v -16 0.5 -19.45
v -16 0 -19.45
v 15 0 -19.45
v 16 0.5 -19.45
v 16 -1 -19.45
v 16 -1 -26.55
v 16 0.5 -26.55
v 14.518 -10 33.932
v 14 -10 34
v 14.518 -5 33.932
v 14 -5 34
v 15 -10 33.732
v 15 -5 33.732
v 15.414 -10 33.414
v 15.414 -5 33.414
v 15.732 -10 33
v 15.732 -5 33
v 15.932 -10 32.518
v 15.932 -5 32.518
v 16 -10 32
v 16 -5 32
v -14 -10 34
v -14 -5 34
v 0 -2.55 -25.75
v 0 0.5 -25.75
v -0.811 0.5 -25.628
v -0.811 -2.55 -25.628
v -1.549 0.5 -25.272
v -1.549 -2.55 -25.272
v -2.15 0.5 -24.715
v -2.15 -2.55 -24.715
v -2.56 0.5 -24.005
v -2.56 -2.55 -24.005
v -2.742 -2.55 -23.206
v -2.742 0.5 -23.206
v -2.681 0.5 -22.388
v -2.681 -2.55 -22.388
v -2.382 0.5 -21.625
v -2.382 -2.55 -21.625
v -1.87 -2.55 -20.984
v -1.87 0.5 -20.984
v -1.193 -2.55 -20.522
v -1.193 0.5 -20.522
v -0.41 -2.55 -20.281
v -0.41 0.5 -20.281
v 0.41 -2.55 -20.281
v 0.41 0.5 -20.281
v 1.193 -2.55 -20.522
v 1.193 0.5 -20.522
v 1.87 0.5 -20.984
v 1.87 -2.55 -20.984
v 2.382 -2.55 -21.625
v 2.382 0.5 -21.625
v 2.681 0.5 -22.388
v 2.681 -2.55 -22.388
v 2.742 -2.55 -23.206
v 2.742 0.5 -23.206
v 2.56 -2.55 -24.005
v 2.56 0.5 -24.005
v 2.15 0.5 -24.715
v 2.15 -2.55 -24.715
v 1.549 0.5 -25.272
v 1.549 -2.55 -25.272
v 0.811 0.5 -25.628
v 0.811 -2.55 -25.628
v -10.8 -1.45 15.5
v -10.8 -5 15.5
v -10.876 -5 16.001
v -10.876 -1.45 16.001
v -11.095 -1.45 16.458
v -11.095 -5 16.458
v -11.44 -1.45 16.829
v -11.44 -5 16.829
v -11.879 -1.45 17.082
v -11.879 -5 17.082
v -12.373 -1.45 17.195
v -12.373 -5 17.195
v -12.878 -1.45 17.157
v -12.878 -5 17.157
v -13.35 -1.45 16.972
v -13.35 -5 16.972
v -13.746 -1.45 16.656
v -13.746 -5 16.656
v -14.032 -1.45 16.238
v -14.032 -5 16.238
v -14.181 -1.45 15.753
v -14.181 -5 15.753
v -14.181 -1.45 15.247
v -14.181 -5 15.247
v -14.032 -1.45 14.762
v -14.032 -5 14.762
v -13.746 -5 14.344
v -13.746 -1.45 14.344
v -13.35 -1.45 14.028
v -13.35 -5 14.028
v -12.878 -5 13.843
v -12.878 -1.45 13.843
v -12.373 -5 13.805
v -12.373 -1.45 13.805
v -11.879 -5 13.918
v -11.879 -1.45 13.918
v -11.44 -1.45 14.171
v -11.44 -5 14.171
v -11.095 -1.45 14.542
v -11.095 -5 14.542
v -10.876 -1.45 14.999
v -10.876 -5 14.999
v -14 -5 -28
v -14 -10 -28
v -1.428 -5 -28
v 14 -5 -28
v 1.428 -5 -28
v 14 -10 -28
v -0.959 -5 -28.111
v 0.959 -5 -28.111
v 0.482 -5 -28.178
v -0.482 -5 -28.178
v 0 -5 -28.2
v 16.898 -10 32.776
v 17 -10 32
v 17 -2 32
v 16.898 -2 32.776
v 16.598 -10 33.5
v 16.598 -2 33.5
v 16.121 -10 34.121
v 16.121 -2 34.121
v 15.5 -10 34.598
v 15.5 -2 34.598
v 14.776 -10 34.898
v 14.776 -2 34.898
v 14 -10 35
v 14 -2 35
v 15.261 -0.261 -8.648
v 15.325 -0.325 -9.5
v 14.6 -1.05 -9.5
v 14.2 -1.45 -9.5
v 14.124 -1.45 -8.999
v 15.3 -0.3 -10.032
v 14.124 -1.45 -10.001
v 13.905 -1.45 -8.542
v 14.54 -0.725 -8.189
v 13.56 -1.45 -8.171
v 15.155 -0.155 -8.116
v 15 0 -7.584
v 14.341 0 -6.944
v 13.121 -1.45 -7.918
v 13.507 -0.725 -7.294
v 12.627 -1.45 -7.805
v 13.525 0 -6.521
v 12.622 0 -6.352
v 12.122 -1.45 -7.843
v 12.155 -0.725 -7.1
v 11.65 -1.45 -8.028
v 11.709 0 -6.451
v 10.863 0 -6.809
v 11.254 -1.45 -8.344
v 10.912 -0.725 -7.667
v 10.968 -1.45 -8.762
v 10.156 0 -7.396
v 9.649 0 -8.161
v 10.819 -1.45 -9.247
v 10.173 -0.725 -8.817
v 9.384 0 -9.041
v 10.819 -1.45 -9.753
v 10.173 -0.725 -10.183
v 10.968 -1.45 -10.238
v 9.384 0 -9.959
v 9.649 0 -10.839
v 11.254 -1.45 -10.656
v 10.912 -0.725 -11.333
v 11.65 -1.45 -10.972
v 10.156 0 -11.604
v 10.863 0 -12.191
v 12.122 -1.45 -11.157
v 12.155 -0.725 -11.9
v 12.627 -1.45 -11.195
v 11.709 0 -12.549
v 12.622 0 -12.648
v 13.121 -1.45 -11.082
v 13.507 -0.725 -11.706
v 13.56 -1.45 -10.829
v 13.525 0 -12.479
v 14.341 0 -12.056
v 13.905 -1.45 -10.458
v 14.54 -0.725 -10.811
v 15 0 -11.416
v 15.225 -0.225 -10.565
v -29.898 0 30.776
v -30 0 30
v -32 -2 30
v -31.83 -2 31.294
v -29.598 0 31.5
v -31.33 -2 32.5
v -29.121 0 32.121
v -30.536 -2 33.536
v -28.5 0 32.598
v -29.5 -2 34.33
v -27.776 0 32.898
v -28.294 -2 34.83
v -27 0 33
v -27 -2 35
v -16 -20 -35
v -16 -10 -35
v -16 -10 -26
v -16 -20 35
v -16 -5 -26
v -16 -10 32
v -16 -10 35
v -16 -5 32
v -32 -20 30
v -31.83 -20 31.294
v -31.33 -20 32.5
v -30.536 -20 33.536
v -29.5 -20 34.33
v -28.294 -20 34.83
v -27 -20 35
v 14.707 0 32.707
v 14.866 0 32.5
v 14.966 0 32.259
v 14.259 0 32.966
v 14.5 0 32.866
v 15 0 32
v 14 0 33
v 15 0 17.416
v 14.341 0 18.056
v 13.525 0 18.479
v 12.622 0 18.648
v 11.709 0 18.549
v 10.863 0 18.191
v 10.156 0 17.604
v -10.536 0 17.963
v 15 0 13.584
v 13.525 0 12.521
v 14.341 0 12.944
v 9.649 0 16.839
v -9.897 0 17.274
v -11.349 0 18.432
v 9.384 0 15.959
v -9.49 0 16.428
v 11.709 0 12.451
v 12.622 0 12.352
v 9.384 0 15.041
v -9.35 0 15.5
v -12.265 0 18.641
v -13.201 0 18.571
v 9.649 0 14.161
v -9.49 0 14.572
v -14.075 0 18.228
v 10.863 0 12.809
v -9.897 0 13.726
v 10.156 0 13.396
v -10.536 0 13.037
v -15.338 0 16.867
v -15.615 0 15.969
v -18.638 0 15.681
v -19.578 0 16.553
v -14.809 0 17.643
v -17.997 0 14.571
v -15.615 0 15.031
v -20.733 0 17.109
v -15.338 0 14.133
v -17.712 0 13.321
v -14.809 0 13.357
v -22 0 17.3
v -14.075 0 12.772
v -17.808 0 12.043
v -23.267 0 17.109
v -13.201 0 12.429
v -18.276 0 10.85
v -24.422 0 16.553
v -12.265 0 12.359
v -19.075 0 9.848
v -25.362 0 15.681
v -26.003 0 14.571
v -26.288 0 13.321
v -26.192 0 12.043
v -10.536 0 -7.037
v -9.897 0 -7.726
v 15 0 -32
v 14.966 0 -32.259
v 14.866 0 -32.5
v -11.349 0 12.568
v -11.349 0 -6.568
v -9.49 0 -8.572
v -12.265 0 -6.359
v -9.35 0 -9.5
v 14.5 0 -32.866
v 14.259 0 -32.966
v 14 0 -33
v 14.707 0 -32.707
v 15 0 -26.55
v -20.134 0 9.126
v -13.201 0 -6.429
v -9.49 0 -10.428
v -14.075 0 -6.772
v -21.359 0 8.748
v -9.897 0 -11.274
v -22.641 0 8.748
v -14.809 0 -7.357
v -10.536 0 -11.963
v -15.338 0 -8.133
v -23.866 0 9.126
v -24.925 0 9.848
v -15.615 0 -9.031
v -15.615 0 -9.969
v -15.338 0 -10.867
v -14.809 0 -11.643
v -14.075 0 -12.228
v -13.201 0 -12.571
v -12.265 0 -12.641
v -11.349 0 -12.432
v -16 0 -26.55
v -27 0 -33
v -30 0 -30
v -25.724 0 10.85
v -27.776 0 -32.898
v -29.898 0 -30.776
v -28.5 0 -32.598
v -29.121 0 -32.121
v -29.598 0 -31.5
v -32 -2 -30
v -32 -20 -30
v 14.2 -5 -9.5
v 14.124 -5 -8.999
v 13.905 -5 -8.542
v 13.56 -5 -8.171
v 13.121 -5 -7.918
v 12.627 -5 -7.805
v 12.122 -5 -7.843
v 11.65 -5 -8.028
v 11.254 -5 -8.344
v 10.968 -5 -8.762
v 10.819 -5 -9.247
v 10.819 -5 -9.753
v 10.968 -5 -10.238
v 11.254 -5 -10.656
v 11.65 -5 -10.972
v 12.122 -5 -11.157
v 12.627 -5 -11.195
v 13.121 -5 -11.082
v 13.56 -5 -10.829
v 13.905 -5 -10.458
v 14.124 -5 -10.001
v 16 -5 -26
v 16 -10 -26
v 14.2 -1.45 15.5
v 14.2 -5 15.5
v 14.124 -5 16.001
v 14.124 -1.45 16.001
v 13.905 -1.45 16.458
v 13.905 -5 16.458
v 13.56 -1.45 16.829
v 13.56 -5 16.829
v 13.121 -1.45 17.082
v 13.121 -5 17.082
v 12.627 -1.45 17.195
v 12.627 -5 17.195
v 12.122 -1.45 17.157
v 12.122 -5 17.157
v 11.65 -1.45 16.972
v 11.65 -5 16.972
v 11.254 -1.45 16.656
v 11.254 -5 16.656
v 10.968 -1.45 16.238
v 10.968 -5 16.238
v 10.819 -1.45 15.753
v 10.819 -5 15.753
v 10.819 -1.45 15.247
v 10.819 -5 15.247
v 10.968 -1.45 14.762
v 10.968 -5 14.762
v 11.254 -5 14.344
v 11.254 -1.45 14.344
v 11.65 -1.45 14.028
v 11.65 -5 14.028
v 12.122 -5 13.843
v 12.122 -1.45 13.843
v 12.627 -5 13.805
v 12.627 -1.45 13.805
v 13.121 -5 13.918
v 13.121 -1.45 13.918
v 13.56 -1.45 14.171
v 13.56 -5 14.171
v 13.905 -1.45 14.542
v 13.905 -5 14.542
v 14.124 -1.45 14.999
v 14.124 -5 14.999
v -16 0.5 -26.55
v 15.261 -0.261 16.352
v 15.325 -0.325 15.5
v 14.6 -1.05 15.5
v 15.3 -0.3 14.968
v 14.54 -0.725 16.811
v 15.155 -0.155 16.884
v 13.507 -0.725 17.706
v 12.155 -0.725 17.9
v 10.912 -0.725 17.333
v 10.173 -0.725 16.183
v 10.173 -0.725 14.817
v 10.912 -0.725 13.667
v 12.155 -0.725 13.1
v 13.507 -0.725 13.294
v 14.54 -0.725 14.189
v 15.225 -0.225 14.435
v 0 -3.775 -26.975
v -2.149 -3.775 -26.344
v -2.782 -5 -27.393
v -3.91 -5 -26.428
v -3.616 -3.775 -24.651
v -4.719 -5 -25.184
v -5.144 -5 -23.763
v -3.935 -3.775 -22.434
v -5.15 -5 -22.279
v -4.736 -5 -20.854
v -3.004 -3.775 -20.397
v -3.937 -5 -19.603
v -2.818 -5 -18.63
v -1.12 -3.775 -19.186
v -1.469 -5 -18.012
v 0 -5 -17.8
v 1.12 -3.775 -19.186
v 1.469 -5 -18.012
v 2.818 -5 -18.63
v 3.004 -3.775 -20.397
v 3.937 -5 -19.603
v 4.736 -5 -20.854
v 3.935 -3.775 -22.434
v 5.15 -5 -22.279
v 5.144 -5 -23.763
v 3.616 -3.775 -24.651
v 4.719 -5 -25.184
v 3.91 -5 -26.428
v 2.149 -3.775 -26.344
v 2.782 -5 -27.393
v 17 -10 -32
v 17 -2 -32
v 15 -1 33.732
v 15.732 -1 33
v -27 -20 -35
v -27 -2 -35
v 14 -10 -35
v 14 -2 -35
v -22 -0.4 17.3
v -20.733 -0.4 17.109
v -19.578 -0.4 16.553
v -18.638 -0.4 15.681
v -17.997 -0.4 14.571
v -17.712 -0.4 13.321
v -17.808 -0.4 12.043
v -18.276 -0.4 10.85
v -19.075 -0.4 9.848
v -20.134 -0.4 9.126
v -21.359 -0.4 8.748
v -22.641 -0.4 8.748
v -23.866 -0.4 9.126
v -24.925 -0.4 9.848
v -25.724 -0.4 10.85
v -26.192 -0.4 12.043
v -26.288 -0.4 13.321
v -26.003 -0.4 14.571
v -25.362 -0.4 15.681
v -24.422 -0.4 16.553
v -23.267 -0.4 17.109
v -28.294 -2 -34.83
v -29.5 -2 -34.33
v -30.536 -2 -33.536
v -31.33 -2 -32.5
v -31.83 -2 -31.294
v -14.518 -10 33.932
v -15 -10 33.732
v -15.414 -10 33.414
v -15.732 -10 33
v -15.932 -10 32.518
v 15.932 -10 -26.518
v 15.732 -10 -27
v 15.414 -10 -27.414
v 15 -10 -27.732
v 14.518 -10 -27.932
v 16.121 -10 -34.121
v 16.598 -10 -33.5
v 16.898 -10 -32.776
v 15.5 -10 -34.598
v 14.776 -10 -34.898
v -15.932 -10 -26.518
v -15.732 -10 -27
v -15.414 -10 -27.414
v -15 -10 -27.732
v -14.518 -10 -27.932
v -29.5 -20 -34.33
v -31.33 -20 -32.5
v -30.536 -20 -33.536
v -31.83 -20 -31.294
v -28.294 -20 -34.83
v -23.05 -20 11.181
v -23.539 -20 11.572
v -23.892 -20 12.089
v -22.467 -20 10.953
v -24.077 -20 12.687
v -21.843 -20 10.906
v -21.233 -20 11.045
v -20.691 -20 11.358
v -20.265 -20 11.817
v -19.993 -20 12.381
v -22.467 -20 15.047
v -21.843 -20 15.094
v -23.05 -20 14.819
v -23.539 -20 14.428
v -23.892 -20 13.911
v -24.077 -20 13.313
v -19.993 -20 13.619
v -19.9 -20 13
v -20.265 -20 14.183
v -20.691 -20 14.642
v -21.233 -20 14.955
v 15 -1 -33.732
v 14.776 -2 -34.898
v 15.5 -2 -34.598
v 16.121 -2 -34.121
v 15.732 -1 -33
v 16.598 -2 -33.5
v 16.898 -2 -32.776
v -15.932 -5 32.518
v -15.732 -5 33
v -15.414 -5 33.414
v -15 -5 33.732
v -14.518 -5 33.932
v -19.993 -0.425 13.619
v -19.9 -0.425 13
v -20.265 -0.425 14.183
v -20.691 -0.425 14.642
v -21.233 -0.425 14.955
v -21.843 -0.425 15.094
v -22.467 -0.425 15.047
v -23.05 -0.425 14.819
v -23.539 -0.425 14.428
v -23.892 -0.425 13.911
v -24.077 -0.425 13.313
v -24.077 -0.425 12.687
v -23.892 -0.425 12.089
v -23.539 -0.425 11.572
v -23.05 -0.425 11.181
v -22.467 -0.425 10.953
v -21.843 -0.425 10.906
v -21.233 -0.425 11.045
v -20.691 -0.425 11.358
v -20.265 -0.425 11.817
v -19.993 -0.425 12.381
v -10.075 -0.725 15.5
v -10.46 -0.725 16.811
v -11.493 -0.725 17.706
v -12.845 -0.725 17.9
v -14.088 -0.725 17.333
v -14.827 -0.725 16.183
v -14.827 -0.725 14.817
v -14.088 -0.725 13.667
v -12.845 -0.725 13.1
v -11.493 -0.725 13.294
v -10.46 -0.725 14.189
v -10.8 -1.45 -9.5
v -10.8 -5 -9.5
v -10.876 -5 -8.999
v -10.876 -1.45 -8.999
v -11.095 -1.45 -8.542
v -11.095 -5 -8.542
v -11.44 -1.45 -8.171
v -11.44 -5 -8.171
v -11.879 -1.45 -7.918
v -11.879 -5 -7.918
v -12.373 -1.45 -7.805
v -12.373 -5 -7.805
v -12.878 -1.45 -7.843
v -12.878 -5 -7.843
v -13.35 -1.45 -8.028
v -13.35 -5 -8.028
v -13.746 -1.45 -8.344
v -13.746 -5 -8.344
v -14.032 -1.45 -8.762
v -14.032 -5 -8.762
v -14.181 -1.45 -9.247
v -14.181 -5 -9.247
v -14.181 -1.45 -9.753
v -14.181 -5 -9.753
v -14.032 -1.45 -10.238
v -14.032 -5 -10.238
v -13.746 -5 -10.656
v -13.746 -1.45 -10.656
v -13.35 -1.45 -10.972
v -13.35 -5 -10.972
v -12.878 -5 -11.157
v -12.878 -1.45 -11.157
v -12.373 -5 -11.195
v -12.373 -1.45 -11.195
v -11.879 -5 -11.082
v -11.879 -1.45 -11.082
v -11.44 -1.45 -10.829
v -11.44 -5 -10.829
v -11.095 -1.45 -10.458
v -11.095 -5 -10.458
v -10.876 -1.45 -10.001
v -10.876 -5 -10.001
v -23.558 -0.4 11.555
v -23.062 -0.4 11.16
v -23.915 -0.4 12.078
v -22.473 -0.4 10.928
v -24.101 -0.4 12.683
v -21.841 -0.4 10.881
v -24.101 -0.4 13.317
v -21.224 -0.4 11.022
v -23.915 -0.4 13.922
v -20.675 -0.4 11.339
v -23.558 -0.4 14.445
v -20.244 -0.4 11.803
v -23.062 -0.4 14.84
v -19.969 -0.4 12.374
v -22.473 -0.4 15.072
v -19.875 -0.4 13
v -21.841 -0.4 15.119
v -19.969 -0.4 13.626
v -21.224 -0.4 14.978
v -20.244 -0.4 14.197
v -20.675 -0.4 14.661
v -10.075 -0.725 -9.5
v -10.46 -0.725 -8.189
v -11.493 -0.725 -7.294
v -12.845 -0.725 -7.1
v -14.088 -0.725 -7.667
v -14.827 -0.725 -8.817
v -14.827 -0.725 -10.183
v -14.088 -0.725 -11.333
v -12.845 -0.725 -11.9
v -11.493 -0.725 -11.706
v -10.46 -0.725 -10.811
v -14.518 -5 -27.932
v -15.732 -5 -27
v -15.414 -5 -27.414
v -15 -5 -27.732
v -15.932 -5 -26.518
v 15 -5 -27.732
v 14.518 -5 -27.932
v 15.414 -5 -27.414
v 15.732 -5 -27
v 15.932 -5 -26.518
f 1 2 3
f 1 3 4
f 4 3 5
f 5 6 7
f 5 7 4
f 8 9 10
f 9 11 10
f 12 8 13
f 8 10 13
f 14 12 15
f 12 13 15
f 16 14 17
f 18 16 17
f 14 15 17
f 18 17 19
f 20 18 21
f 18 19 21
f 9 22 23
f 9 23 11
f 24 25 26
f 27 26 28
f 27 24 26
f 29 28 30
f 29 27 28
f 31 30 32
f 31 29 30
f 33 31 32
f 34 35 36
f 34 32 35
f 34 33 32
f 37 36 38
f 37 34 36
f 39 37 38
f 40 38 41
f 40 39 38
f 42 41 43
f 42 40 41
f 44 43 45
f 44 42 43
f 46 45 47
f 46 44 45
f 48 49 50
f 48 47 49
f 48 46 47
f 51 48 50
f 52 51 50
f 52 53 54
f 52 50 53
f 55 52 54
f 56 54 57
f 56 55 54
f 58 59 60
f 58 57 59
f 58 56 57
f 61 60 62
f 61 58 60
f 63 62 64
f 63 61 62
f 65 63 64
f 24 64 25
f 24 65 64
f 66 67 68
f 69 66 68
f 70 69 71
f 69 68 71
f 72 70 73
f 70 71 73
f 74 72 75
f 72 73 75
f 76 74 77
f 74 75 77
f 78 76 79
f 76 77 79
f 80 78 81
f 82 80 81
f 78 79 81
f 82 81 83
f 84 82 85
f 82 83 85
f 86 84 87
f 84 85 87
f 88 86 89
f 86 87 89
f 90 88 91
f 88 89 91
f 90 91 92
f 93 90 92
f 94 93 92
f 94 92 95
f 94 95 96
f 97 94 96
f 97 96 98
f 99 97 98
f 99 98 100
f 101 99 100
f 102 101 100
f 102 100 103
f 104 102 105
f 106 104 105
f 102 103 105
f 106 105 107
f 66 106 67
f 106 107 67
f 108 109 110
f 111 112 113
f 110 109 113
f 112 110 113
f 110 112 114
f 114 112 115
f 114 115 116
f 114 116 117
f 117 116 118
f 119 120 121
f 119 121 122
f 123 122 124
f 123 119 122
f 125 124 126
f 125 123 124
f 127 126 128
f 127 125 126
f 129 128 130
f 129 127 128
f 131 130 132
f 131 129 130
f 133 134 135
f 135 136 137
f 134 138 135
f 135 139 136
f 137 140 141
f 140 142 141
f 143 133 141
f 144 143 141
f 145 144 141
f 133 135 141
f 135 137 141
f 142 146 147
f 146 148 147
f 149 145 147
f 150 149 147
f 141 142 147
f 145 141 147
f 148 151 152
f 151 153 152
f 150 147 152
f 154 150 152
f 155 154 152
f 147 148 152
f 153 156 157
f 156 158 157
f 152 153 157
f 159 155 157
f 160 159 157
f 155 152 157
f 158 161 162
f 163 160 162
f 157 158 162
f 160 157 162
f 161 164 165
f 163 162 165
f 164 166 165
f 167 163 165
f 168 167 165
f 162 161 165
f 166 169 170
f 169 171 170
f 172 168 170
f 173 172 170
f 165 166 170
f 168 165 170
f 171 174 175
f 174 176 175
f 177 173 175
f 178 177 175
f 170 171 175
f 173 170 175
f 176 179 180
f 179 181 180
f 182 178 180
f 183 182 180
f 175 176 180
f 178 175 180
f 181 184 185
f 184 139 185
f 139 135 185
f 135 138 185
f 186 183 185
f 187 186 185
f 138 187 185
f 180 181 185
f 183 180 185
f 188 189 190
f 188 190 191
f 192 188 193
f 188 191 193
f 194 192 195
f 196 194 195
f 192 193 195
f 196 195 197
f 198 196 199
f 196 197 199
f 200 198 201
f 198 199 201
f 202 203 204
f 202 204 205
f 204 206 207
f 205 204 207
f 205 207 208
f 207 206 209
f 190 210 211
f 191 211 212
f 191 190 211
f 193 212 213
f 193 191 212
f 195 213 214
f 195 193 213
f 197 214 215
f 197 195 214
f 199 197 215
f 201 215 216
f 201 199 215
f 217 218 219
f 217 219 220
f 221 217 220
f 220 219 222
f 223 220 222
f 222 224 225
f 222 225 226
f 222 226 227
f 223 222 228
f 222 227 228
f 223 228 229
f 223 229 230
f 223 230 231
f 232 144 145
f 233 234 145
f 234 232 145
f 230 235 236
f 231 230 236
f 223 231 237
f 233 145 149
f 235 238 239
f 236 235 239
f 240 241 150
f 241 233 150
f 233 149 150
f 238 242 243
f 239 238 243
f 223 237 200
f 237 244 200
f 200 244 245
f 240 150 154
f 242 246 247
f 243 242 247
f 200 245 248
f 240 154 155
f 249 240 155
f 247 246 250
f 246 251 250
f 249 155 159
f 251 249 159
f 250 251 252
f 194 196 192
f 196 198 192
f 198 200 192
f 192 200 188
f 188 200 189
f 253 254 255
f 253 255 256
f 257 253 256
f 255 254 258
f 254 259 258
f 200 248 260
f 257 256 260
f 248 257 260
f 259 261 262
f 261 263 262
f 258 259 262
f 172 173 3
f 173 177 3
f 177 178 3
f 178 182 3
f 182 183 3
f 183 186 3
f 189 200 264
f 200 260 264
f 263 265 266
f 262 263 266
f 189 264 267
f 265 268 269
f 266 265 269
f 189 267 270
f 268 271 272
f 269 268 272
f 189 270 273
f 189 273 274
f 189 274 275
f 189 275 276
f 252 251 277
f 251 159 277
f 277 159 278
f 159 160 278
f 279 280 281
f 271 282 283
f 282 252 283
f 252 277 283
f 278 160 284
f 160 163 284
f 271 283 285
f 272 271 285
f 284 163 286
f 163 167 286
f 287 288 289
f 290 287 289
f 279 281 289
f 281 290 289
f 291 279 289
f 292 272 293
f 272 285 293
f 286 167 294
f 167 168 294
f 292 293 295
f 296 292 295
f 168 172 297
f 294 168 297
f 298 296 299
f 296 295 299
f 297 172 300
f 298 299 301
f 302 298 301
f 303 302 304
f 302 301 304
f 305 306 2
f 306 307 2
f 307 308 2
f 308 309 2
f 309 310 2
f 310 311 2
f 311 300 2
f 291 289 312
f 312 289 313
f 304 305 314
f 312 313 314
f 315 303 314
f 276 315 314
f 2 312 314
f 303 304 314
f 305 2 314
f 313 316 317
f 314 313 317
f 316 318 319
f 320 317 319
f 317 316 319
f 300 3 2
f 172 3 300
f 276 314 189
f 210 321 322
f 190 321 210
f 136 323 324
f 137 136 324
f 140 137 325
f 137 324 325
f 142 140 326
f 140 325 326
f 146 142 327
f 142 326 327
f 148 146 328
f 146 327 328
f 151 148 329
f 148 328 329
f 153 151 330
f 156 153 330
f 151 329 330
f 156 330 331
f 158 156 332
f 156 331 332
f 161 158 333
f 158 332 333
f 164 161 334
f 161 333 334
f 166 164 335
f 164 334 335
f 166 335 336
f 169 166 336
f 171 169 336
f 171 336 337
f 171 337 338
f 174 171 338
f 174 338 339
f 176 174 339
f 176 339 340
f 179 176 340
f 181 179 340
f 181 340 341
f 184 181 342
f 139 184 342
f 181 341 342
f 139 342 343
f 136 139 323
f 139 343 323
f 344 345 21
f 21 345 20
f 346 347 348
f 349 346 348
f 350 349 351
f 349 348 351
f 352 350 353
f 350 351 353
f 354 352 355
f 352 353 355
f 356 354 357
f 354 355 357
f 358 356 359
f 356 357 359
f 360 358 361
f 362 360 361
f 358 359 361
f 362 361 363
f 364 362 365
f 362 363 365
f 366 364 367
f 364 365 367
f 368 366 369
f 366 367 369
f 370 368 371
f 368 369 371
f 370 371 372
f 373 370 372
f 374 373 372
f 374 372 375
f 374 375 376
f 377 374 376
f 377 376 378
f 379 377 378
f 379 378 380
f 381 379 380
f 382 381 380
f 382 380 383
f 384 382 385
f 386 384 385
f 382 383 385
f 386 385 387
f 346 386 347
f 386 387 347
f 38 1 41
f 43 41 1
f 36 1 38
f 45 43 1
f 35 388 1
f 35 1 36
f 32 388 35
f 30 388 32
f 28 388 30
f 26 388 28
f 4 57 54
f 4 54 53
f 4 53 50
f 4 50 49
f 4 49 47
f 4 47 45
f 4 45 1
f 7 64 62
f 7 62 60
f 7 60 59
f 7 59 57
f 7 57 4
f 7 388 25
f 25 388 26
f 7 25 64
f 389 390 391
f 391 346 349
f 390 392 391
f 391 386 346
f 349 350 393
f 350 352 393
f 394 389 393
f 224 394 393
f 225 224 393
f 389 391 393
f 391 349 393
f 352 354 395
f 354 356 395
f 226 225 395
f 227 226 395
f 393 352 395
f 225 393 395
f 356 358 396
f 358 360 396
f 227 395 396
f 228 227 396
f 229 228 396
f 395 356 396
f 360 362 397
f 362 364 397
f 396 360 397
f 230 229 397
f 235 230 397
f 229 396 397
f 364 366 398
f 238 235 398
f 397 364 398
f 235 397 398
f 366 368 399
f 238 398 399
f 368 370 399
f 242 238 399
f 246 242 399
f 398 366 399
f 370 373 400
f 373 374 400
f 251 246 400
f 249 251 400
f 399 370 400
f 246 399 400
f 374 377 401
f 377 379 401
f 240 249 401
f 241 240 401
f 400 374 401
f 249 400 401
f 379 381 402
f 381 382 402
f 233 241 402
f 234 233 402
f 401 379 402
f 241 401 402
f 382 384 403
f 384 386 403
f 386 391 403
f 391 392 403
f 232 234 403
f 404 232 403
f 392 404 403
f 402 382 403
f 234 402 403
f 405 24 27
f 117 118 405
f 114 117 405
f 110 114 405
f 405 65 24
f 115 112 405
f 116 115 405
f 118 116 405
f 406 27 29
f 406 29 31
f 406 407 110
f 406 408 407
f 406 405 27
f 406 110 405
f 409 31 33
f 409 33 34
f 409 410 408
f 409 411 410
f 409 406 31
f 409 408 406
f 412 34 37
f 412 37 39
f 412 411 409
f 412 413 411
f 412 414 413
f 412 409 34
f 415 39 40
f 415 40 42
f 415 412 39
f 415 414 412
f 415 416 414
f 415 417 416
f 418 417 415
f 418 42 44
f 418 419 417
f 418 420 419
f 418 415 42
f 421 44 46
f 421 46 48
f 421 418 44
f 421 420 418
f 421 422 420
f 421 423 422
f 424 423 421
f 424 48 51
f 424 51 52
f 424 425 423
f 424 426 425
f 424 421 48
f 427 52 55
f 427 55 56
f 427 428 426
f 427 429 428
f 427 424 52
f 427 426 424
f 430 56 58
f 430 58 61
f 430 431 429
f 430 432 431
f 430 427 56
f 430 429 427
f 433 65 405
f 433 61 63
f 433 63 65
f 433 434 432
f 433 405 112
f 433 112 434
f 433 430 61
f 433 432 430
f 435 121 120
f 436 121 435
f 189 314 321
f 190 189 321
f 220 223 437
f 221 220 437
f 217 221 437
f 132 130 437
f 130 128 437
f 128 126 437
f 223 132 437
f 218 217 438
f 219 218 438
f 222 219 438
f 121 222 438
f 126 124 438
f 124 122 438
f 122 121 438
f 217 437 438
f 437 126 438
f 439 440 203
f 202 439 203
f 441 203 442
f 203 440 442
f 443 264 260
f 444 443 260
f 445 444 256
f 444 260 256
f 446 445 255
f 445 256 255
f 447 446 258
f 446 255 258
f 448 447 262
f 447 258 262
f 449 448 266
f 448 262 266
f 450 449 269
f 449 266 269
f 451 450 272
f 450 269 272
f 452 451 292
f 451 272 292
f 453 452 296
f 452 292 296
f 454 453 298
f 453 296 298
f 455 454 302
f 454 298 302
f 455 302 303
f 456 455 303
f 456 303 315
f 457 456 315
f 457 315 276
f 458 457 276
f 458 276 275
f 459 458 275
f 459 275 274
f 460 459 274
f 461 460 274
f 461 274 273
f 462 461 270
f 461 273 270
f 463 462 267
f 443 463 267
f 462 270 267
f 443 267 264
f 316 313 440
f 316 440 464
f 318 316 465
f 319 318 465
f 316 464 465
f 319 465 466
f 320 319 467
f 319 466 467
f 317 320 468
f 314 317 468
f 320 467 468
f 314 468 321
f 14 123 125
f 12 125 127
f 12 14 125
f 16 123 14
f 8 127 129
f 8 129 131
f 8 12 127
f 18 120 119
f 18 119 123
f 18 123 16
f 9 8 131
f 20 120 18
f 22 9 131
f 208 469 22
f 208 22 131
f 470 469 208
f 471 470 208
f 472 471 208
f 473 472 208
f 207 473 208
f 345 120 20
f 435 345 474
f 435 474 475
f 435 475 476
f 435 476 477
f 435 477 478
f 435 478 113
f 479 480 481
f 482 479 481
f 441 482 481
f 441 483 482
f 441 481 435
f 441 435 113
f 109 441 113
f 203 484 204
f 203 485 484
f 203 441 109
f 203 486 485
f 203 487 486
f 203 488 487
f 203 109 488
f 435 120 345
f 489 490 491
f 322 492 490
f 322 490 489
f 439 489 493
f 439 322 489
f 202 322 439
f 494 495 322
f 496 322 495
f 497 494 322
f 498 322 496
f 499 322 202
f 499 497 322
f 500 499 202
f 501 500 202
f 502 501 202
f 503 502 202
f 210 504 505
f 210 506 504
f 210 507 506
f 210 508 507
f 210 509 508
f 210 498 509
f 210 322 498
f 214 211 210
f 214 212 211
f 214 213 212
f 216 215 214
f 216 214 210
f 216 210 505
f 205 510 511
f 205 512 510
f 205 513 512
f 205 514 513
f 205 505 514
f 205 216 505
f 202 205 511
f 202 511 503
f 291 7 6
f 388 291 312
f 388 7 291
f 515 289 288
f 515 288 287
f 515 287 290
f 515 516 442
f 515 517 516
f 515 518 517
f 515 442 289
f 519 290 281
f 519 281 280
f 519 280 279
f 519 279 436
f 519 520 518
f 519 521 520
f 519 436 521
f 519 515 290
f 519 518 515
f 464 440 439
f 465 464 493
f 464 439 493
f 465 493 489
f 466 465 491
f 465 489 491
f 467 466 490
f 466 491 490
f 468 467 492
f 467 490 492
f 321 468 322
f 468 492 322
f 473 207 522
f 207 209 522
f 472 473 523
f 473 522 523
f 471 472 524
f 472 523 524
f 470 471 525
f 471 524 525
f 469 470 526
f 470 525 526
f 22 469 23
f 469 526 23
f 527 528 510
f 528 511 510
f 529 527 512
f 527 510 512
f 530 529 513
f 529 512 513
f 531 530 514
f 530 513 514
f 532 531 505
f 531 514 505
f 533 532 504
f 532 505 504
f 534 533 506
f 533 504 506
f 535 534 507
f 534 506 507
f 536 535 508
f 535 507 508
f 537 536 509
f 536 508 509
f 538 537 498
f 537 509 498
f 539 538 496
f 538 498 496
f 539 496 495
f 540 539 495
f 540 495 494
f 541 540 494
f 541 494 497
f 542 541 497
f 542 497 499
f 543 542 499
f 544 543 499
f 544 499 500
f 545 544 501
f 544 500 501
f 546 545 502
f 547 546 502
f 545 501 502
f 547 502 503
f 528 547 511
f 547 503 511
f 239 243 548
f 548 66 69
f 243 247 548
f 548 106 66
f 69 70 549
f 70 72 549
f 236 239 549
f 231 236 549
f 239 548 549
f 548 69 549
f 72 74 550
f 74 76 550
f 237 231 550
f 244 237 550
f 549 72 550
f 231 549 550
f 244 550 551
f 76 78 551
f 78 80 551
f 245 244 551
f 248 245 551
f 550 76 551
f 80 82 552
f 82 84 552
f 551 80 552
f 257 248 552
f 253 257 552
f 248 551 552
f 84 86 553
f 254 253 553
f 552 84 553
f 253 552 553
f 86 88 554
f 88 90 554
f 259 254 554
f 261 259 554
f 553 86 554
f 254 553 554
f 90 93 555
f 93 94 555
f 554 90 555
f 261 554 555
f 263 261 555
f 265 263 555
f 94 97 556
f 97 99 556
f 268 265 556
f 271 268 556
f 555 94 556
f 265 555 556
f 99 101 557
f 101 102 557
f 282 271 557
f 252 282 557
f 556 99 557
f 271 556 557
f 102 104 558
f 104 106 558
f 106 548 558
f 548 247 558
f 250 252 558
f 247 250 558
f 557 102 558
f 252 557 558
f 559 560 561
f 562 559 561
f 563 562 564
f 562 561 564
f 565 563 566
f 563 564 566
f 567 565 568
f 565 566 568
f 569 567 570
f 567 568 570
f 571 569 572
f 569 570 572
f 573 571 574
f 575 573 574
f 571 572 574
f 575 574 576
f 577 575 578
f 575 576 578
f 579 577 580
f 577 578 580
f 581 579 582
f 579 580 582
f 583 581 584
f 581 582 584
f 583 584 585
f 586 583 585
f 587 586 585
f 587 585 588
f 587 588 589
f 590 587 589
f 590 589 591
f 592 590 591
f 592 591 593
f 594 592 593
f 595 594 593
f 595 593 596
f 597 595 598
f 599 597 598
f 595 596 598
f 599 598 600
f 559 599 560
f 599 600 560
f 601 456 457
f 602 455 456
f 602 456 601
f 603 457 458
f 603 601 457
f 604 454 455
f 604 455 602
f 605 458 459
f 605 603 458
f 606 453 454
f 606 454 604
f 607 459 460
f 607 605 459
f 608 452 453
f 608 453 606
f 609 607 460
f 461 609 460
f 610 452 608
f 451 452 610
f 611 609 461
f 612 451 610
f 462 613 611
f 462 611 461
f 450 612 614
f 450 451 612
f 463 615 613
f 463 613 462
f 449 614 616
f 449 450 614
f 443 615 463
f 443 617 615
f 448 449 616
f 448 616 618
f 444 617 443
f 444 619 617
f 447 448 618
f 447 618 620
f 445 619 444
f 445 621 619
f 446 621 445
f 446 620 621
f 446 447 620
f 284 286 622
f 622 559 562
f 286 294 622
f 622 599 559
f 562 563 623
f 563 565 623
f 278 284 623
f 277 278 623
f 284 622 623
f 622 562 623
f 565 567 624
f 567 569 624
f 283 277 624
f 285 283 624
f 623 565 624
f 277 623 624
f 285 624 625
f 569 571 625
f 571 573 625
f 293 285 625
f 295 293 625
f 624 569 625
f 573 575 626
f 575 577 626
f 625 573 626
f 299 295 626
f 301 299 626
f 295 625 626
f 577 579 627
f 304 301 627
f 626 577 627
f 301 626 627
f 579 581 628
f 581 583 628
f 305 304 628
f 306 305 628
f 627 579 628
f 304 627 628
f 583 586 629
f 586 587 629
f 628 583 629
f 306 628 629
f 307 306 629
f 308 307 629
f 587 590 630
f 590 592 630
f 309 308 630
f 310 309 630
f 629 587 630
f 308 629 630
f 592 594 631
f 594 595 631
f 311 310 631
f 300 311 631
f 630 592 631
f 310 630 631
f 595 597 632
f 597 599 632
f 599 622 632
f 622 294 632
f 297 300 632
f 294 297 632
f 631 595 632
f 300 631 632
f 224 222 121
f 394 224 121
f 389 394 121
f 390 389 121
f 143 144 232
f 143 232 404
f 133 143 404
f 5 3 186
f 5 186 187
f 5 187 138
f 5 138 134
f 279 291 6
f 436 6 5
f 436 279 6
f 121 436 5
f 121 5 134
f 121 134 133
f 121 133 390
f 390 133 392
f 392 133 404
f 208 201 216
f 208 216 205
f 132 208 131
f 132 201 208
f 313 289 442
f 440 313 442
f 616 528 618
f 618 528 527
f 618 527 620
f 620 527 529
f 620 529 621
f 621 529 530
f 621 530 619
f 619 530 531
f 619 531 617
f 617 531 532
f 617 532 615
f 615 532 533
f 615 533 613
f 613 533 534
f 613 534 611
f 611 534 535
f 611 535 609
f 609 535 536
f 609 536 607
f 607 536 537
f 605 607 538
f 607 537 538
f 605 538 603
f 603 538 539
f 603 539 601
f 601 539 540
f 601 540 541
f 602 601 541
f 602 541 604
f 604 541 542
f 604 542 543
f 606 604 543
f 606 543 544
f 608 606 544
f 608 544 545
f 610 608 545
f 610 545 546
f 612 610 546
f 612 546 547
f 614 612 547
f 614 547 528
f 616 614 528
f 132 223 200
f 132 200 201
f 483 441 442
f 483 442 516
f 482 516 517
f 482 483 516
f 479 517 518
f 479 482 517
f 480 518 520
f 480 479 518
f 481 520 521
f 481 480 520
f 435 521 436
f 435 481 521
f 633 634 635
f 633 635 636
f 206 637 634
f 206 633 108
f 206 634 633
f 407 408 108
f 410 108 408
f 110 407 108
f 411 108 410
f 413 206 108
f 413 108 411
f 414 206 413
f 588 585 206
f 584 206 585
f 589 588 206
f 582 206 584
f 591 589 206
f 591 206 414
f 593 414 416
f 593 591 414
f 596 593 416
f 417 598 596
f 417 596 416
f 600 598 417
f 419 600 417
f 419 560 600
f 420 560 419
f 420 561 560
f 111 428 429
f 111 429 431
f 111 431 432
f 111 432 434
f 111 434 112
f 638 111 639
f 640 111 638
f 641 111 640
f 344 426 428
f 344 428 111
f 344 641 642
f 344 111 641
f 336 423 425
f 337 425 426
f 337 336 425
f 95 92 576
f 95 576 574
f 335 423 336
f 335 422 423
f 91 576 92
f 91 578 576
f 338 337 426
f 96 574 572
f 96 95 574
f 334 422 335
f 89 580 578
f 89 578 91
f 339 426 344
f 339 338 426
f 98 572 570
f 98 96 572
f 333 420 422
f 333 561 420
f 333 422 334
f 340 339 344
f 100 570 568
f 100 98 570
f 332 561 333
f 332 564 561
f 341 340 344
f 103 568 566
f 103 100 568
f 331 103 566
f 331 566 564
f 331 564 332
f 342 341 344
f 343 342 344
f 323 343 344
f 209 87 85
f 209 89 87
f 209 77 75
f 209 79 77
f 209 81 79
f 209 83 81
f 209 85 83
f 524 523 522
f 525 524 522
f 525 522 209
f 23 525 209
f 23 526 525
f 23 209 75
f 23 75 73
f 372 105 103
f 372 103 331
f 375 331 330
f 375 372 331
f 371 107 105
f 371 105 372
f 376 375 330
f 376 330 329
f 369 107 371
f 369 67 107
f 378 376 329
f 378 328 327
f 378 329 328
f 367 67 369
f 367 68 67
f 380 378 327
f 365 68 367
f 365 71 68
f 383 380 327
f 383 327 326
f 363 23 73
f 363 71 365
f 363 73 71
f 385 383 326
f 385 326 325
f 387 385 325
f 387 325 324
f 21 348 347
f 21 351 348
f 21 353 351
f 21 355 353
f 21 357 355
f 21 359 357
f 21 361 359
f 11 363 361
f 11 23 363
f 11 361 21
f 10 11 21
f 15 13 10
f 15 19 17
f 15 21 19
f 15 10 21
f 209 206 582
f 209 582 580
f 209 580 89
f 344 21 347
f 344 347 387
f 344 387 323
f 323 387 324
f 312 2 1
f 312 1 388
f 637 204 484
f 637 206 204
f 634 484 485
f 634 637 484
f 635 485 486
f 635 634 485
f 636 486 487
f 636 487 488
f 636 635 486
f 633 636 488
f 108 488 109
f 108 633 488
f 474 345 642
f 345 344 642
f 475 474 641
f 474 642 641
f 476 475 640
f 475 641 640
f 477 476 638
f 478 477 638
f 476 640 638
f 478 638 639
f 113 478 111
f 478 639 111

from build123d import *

# Parameters (mm, degrees)
SKETCH_1_W                   = 34
SKETCH_1_H                   = 70
EXTRUDE_317_DEPTH            = 10
SKETCH_7_W                   = 15
SKETCH_7_H                   = 70
EXTRUDE_2_DEPTH              = 10
HOLE_WIZARD_M3_D             = 3.4
HOLE_WIZARD_M3_CSINK_D       = 6.3
HOLE_WIZARD_M3_CSINK_ANGLE   = 90
SKETCH_19_W                  = 32
SKETCH_19_H                  = 62
CUT_EXTRUDE_2_DEPTH          = 5
SKETCH_17_W                  = 32
SKETCH_17_H                  = 7.1
EXTRUDE_2650_DEPTH           = 0.5
SKETCH_20_W                  = 16
SKETCH_20_H                  = 70
EXTRUDE_1_DEPTH              = 10
HOLE_WIZARD_M5_2_D           = 4.2
HOLE_WIZARD_M5_2_CSINK_D     = 5.05
HOLE_WIZARD_M5_2_CSINK_ANGLE = 90
FILLET_1_R                   = 3
FILLET_3_R                   = 5
SKETCH_18_R                  = 4.3
CUT_EXTRUDE_1_DEPTH          = 0.4
FILLET_2_R                   = 2
CHAMFER_2_SIZE               = 2


with BuildPart() as part:
    # Эскиз1 → Extrude 317 (new body)
    with BuildSketch(Plane(origin=(0, 0, 0), x_dir=(1, 0, 0), z_dir=(0, 1, 0))):
        Rectangle(SKETCH_1_W, SKETCH_1_H)
    extrude(amount=-EXTRUDE_317_DEPTH)

    # Эскиз7 → База2 (add)
    with BuildSketch(Plane(origin=(0, 0, 0), x_dir=(-1, 0, 0), z_dir=(0, -1, 0))):
        with Locations((24.5, 0)):
            Rectangle(SKETCH_7_W, SKETCH_7_H)
    extrude(amount=EXTRUDE_2_DEPTH)

    # Крепление каретки M3 (through all)
    with Locations(Plane(origin=(0, 0, 0), x_dir=(-1, 0, 0), z_dir=(0, 1, 0))):
        with Locations((-12.5, -9.5), (12.5, -9.5), (12.5, 15.5), (-12.5, 15.5)):
            CounterSinkHole(HOLE_WIZARD_M3_D / 2, HOLE_WIZARD_M3_CSINK_D / 2, counter_sink_angle=HOLE_WIZARD_M3_CSINK_ANGLE)

    # Эскиз19 → Вырез-Вытянуть2 (cut)
    with BuildSketch(Plane.XZ.offset(10)):
        with Locations((0, 3)):
            Rectangle(SKETCH_19_W, SKETCH_19_H)
    extrude(amount=-CUT_EXTRUDE_2_DEPTH, mode=Mode.SUBTRACT)

    # Эскиз17 → Extrude 2650 (add)
    with BuildSketch(Plane(origin=(0, 0, 0), x_dir=(1, 0, 0), z_dir=(0, 1, 0))):
        with Locations((0, 23)):
            Rectangle(SKETCH_17_W, SKETCH_17_H)
    extrude(amount=EXTRUDE_2650_DEPTH)

    # Эскиз16 → Hole Wizard M5 (revolve, cut)
    with BuildSketch(Plane(origin=(0, -5, -23), x_dir=(0, 0, -1), z_dir=(1, 0, 0))):
        Polygon((0, 0), (0, 23.152366702), (2.75, 21.5), (2.75, 2.45), (5.2, 0), align=None)
    revolve(axis=Axis((0, -11.35, -23), (0, 1, 0)), mode=Mode.SUBTRACT)

    # Эскиз20 → Бобышка-Вытянуть1 (add)
    with BuildSketch(Plane.XZ.offset(10)):
        with Locations((-24, 0)):
            Rectangle(SKETCH_20_W, SKETCH_20_H)
    extrude(amount=EXTRUDE_1_DEPTH)

    # Hole Wizard M5 2 (through all)
    with Locations(Plane(origin=(0, 0, 0), x_dir=(-1, 0, 0), z_dir=(0, 1, 0))):
        with Locations((22, 13)):
            CounterSinkHole(HOLE_WIZARD_M5_2_D / 2, HOLE_WIZARD_M5_2_CSINK_D / 2, counter_sink_angle=HOLE_WIZARD_M5_2_CSINK_ANGLE)

    # Скругление1
    fillet_1_edges = [part.edges().sort_by_distance(p)[0] for p in [
        (17, -5, 35),
        (17, -5, -35),
    ]]
    fillet(fillet_1_edges, radius=FILLET_1_R)

    # Скругление3
    fillet_3_edges = [part.edges().sort_by_distance(p)[0] for p in [
        (-32, -10, -35),
        (-32, -10, 35),
    ]]
    fillet(fillet_3_edges, radius=FILLET_3_R)

    # Эскиз18 → Вырез-Вытянуть1 (cut)
    with BuildSketch(Plane(origin=(0, 0, 0), x_dir=(1, 0, 0), z_dir=(0, 1, 0))):
        with Locations(Location((-22, -13, 0), (0, 0, 270))):
            Circle(SKETCH_18_R)
    extrude(amount=-CUT_EXTRUDE_1_DEPTH, mode=Mode.SUBTRACT)

    # Скругление2
    fillet_2_edges = [part.edges().sort_by_distance(p)[0] for p in [
        (16, -7.5, 34),
        (16, -7.5, -28),
        (-16, -7.5, -28),
        (-16, -7.5, 34),
    ]]
    fillet(fillet_2_edges, radius=FILLET_2_R)

    # Фаска2
    # the kernel refuses this chamfer: 2 mm, written as the material it takes off along each edge
    with BuildSketch(Plane(origin=(14, 0, 32), x_dir=(0, 0, 1), z_dir=(-1, 0, 0))) as chamfer_2_piece_1:
        Polygon((3 - CHAMFER_2_SIZE, 0), (3, -CHAMFER_2_SIZE), (3, 0), align=None)
    revolve(axis=Axis((14, 0, 32), (0, 1, 0)), revolution_arc=90, mode=Mode.SUBTRACT)
    with BuildSketch(Plane(origin=(17, 0, -32), x_dir=(-0.9996219169112968, 0.027495876610586365, 0), z_dir=(0, 0, 1))) as chamfer_2_piece_2_section:
        Polygon((CHAMFER_2_SIZE * 0.999621916911, CHAMFER_2_SIZE * 0.0274958766106), (-CHAMFER_2_SIZE * 0.0274958766106, CHAMFER_2_SIZE * 0.999621916911), (0, 0), align=None)
    chamfer_2_piece_2 = extrude(amount=64, mode=Mode.PRIVATE)
    chamfer_2_piece_2 = split(chamfer_2_piece_2, bisect_by=Plane(origin=(15.636280777, -0.291141314, -26.55), z_dir=(0, 0, -1)), keep=Keep.TOP, mode=Mode.PRIVATE)
    chamfer_2_piece_2 = split(chamfer_2_piece_2, bisect_by=Plane(origin=(16, -0.291141314, -29.275), z_dir=(-1, 0, 0)), keep=Keep.TOP, mode=Mode.PRIVATE)
    add(chamfer_2_piece_2, mode=Mode.SUBTRACT)
    with BuildSketch(Plane(origin=(17, 0, -32), x_dir=(-0.9996219169112968, 0.027495876610586365, 0), z_dir=(0, 0, 1))) as chamfer_2_piece_3_section:
        Polygon((CHAMFER_2_SIZE * 0.999621916911, CHAMFER_2_SIZE * 0.0274958766106), (-CHAMFER_2_SIZE * 0.0274958766106, CHAMFER_2_SIZE * 0.999621916911), (0, 0), align=None)
    chamfer_2_piece_3 = extrude(amount=64, mode=Mode.PRIVATE)
    chamfer_2_piece_3 = split(chamfer_2_piece_3, bisect_by=Plane(origin=(16.58353142, -0.786802168, -26.55), z_dir=(0, 0, -1)), keep=Keep.TOP, mode=Mode.PRIVATE)
    chamfer_2_piece_3 = split(chamfer_2_piece_3, bisect_by=Plane(origin=(16, -0.786802168, -29.275), z_dir=(1, 0, 0)), keep=Keep.TOP, mode=Mode.PRIVATE)
    add(chamfer_2_piece_3, mode=Mode.SUBTRACT)
    with BuildSketch(Plane(origin=(17, 0, -32), x_dir=(-0.9996219169112968, 0.027495876610586365, 0), z_dir=(0, 0, 1))) as chamfer_2_piece_4_section:
        Polygon((CHAMFER_2_SIZE * 0.999621916911, CHAMFER_2_SIZE * 0.0274958766106), (-CHAMFER_2_SIZE * 0.0274958766106, CHAMFER_2_SIZE * 0.999621916911), (0, 0), align=None)
    chamfer_2_piece_4 = extrude(amount=64, mode=Mode.PRIVATE)
    chamfer_2_piece_4 = split(chamfer_2_piece_4, bisect_by=Plane(origin=(16.58353142, -0.786802168, -26.55), z_dir=(0, 0, 1)), keep=Keep.TOP, mode=Mode.PRIVATE)
    chamfer_2_piece_4 = split(chamfer_2_piece_4, bisect_by=Plane(origin=(16, -0.786802168, -23), z_dir=(1, 0, 0)), keep=Keep.TOP, mode=Mode.PRIVATE)
    chamfer_2_piece_4 = split(chamfer_2_piece_4, bisect_by=Plane(origin=(16.58353142, -0.786802168, -19.45), z_dir=(0, 0, -1)), keep=Keep.TOP, mode=Mode.PRIVATE)
    add(chamfer_2_piece_4, mode=Mode.SUBTRACT)
    with BuildSketch(Plane(origin=(17, 0, -32), x_dir=(-0.9996219169112968, 0.027495876610586365, 0), z_dir=(0, 0, 1))) as chamfer_2_piece_5_section:
        Polygon((CHAMFER_2_SIZE * 0.999621916911, CHAMFER_2_SIZE * 0.0274958766106), (-CHAMFER_2_SIZE * 0.0274958766106, CHAMFER_2_SIZE * 0.999621916911), (0, 0), align=None)
    chamfer_2_piece_5 = extrude(amount=64, mode=Mode.PRIVATE)
    chamfer_2_piece_5 = split(chamfer_2_piece_5, bisect_by=Plane(origin=(16, -0.291141314, 6.275), z_dir=(-1, 0, 0)), keep=Keep.TOP, mode=Mode.PRIVATE)
    chamfer_2_piece_5 = split(chamfer_2_piece_5, bisect_by=Plane(origin=(15.636280777, -0.291141314, -19.45), z_dir=(0, 0, 1)), keep=Keep.TOP, mode=Mode.PRIVATE)
    add(chamfer_2_piece_5, mode=Mode.SUBTRACT)
    with BuildSketch(Plane(origin=(17, 0, -32), x_dir=(-0.9996219169112968, 0.027495876610586365, 0), z_dir=(0, 0, 1))) as chamfer_2_piece_6_section:
        Polygon((CHAMFER_2_SIZE * 0.999621916911, CHAMFER_2_SIZE * 0.0274958766106), (-CHAMFER_2_SIZE * 0.0274958766106, CHAMFER_2_SIZE * 0.999621916911), (0, 0), align=None)
    chamfer_2_piece_6 = extrude(amount=64, mode=Mode.PRIVATE)
    chamfer_2_piece_6 = split(chamfer_2_piece_6, bisect_by=Plane(origin=(16, -0.786802168, 6.275), z_dir=(1, 0, 0)), keep=Keep.TOP, mode=Mode.PRIVATE)
    chamfer_2_piece_6 = split(chamfer_2_piece_6, bisect_by=Plane(origin=(16.58353142, -0.786802168, -19.45), z_dir=(0, 0, 1)), keep=Keep.TOP, mode=Mode.PRIVATE)
    add(chamfer_2_piece_6, mode=Mode.SUBTRACT)
    with BuildSketch(Plane(origin=(14, 0, -32), x_dir=(0, 0, -1), z_dir=(-1, 0, 0))) as chamfer_2_piece_7:
        Polygon((3 - CHAMFER_2_SIZE, 0), (3, CHAMFER_2_SIZE), (3, 0), align=None)
    revolve(axis=Axis((14, 0, -32), (0, -1, 0)), revolution_arc=90, mode=Mode.SUBTRACT)
    with BuildSketch(Plane(origin=(-27, 0, -35), x_dir=(0, 0.02749587661058639, 0.9996219169112968), z_dir=(1, 0, 0))) as chamfer_2_piece_8:
        Polygon((CHAMFER_2_SIZE * 0.999621916911, CHAMFER_2_SIZE * 0.0274958766106), (-CHAMFER_2_SIZE * 0.0274958766106, CHAMFER_2_SIZE * 0.999621916911), (0, 0), align=None)
    extrude(amount=41, mode=Mode.SUBTRACT)
    with BuildSketch(Plane(origin=(-32, 0, -30), x_dir=(0.9996219169112968, 0.02749587661058639, 0), z_dir=(0, 0, 1))) as chamfer_2_piece_9:
        Polygon((CHAMFER_2_SIZE * 0.999621916911, -CHAMFER_2_SIZE * 0.0274958766106), (-CHAMFER_2_SIZE * 0.0274958766106, -CHAMFER_2_SIZE * 0.999621916911), (0, 0), align=None)
    extrude(amount=60, mode=Mode.SUBTRACT)
    with BuildSketch(Plane(origin=(-27, 0, 35), x_dir=(0, 0.027495876610586296, -0.9996219169112968), z_dir=(1, 0, 0))) as chamfer_2_piece_10:
        Polygon((CHAMFER_2_SIZE * 0.999621916911, -CHAMFER_2_SIZE * 0.0274958766106), (-CHAMFER_2_SIZE * 0.0274958766106, -CHAMFER_2_SIZE * 0.999621916911), (0, 0), align=None)
    extrude(amount=41, mode=Mode.SUBTRACT)
    with BuildSketch(Plane(origin=(-27, 0, -30), x_dir=(0, 0, -1), z_dir=(1, 0, 0))) as chamfer_2_piece_11:
        Polygon((5 - CHAMFER_2_SIZE, 0), (5, -CHAMFER_2_SIZE), (5, 0), align=None)
    revolve(axis=Axis((-27, 0, -30), (0, 1, 0)), revolution_arc=90, mode=Mode.SUBTRACT)
    with BuildSketch(Plane(origin=(-27, 0, 30), x_dir=(-1, 0, 0), z_dir=(0, 0, -1))) as chamfer_2_piece_12:
        Polygon((5 - CHAMFER_2_SIZE, 0), (5, -CHAMFER_2_SIZE), (5, 0), align=None)
    revolve(axis=Axis((-27, 0, 30), (0, 1, 0)), revolution_arc=90, mode=Mode.SUBTRACT)


solid = part.part
